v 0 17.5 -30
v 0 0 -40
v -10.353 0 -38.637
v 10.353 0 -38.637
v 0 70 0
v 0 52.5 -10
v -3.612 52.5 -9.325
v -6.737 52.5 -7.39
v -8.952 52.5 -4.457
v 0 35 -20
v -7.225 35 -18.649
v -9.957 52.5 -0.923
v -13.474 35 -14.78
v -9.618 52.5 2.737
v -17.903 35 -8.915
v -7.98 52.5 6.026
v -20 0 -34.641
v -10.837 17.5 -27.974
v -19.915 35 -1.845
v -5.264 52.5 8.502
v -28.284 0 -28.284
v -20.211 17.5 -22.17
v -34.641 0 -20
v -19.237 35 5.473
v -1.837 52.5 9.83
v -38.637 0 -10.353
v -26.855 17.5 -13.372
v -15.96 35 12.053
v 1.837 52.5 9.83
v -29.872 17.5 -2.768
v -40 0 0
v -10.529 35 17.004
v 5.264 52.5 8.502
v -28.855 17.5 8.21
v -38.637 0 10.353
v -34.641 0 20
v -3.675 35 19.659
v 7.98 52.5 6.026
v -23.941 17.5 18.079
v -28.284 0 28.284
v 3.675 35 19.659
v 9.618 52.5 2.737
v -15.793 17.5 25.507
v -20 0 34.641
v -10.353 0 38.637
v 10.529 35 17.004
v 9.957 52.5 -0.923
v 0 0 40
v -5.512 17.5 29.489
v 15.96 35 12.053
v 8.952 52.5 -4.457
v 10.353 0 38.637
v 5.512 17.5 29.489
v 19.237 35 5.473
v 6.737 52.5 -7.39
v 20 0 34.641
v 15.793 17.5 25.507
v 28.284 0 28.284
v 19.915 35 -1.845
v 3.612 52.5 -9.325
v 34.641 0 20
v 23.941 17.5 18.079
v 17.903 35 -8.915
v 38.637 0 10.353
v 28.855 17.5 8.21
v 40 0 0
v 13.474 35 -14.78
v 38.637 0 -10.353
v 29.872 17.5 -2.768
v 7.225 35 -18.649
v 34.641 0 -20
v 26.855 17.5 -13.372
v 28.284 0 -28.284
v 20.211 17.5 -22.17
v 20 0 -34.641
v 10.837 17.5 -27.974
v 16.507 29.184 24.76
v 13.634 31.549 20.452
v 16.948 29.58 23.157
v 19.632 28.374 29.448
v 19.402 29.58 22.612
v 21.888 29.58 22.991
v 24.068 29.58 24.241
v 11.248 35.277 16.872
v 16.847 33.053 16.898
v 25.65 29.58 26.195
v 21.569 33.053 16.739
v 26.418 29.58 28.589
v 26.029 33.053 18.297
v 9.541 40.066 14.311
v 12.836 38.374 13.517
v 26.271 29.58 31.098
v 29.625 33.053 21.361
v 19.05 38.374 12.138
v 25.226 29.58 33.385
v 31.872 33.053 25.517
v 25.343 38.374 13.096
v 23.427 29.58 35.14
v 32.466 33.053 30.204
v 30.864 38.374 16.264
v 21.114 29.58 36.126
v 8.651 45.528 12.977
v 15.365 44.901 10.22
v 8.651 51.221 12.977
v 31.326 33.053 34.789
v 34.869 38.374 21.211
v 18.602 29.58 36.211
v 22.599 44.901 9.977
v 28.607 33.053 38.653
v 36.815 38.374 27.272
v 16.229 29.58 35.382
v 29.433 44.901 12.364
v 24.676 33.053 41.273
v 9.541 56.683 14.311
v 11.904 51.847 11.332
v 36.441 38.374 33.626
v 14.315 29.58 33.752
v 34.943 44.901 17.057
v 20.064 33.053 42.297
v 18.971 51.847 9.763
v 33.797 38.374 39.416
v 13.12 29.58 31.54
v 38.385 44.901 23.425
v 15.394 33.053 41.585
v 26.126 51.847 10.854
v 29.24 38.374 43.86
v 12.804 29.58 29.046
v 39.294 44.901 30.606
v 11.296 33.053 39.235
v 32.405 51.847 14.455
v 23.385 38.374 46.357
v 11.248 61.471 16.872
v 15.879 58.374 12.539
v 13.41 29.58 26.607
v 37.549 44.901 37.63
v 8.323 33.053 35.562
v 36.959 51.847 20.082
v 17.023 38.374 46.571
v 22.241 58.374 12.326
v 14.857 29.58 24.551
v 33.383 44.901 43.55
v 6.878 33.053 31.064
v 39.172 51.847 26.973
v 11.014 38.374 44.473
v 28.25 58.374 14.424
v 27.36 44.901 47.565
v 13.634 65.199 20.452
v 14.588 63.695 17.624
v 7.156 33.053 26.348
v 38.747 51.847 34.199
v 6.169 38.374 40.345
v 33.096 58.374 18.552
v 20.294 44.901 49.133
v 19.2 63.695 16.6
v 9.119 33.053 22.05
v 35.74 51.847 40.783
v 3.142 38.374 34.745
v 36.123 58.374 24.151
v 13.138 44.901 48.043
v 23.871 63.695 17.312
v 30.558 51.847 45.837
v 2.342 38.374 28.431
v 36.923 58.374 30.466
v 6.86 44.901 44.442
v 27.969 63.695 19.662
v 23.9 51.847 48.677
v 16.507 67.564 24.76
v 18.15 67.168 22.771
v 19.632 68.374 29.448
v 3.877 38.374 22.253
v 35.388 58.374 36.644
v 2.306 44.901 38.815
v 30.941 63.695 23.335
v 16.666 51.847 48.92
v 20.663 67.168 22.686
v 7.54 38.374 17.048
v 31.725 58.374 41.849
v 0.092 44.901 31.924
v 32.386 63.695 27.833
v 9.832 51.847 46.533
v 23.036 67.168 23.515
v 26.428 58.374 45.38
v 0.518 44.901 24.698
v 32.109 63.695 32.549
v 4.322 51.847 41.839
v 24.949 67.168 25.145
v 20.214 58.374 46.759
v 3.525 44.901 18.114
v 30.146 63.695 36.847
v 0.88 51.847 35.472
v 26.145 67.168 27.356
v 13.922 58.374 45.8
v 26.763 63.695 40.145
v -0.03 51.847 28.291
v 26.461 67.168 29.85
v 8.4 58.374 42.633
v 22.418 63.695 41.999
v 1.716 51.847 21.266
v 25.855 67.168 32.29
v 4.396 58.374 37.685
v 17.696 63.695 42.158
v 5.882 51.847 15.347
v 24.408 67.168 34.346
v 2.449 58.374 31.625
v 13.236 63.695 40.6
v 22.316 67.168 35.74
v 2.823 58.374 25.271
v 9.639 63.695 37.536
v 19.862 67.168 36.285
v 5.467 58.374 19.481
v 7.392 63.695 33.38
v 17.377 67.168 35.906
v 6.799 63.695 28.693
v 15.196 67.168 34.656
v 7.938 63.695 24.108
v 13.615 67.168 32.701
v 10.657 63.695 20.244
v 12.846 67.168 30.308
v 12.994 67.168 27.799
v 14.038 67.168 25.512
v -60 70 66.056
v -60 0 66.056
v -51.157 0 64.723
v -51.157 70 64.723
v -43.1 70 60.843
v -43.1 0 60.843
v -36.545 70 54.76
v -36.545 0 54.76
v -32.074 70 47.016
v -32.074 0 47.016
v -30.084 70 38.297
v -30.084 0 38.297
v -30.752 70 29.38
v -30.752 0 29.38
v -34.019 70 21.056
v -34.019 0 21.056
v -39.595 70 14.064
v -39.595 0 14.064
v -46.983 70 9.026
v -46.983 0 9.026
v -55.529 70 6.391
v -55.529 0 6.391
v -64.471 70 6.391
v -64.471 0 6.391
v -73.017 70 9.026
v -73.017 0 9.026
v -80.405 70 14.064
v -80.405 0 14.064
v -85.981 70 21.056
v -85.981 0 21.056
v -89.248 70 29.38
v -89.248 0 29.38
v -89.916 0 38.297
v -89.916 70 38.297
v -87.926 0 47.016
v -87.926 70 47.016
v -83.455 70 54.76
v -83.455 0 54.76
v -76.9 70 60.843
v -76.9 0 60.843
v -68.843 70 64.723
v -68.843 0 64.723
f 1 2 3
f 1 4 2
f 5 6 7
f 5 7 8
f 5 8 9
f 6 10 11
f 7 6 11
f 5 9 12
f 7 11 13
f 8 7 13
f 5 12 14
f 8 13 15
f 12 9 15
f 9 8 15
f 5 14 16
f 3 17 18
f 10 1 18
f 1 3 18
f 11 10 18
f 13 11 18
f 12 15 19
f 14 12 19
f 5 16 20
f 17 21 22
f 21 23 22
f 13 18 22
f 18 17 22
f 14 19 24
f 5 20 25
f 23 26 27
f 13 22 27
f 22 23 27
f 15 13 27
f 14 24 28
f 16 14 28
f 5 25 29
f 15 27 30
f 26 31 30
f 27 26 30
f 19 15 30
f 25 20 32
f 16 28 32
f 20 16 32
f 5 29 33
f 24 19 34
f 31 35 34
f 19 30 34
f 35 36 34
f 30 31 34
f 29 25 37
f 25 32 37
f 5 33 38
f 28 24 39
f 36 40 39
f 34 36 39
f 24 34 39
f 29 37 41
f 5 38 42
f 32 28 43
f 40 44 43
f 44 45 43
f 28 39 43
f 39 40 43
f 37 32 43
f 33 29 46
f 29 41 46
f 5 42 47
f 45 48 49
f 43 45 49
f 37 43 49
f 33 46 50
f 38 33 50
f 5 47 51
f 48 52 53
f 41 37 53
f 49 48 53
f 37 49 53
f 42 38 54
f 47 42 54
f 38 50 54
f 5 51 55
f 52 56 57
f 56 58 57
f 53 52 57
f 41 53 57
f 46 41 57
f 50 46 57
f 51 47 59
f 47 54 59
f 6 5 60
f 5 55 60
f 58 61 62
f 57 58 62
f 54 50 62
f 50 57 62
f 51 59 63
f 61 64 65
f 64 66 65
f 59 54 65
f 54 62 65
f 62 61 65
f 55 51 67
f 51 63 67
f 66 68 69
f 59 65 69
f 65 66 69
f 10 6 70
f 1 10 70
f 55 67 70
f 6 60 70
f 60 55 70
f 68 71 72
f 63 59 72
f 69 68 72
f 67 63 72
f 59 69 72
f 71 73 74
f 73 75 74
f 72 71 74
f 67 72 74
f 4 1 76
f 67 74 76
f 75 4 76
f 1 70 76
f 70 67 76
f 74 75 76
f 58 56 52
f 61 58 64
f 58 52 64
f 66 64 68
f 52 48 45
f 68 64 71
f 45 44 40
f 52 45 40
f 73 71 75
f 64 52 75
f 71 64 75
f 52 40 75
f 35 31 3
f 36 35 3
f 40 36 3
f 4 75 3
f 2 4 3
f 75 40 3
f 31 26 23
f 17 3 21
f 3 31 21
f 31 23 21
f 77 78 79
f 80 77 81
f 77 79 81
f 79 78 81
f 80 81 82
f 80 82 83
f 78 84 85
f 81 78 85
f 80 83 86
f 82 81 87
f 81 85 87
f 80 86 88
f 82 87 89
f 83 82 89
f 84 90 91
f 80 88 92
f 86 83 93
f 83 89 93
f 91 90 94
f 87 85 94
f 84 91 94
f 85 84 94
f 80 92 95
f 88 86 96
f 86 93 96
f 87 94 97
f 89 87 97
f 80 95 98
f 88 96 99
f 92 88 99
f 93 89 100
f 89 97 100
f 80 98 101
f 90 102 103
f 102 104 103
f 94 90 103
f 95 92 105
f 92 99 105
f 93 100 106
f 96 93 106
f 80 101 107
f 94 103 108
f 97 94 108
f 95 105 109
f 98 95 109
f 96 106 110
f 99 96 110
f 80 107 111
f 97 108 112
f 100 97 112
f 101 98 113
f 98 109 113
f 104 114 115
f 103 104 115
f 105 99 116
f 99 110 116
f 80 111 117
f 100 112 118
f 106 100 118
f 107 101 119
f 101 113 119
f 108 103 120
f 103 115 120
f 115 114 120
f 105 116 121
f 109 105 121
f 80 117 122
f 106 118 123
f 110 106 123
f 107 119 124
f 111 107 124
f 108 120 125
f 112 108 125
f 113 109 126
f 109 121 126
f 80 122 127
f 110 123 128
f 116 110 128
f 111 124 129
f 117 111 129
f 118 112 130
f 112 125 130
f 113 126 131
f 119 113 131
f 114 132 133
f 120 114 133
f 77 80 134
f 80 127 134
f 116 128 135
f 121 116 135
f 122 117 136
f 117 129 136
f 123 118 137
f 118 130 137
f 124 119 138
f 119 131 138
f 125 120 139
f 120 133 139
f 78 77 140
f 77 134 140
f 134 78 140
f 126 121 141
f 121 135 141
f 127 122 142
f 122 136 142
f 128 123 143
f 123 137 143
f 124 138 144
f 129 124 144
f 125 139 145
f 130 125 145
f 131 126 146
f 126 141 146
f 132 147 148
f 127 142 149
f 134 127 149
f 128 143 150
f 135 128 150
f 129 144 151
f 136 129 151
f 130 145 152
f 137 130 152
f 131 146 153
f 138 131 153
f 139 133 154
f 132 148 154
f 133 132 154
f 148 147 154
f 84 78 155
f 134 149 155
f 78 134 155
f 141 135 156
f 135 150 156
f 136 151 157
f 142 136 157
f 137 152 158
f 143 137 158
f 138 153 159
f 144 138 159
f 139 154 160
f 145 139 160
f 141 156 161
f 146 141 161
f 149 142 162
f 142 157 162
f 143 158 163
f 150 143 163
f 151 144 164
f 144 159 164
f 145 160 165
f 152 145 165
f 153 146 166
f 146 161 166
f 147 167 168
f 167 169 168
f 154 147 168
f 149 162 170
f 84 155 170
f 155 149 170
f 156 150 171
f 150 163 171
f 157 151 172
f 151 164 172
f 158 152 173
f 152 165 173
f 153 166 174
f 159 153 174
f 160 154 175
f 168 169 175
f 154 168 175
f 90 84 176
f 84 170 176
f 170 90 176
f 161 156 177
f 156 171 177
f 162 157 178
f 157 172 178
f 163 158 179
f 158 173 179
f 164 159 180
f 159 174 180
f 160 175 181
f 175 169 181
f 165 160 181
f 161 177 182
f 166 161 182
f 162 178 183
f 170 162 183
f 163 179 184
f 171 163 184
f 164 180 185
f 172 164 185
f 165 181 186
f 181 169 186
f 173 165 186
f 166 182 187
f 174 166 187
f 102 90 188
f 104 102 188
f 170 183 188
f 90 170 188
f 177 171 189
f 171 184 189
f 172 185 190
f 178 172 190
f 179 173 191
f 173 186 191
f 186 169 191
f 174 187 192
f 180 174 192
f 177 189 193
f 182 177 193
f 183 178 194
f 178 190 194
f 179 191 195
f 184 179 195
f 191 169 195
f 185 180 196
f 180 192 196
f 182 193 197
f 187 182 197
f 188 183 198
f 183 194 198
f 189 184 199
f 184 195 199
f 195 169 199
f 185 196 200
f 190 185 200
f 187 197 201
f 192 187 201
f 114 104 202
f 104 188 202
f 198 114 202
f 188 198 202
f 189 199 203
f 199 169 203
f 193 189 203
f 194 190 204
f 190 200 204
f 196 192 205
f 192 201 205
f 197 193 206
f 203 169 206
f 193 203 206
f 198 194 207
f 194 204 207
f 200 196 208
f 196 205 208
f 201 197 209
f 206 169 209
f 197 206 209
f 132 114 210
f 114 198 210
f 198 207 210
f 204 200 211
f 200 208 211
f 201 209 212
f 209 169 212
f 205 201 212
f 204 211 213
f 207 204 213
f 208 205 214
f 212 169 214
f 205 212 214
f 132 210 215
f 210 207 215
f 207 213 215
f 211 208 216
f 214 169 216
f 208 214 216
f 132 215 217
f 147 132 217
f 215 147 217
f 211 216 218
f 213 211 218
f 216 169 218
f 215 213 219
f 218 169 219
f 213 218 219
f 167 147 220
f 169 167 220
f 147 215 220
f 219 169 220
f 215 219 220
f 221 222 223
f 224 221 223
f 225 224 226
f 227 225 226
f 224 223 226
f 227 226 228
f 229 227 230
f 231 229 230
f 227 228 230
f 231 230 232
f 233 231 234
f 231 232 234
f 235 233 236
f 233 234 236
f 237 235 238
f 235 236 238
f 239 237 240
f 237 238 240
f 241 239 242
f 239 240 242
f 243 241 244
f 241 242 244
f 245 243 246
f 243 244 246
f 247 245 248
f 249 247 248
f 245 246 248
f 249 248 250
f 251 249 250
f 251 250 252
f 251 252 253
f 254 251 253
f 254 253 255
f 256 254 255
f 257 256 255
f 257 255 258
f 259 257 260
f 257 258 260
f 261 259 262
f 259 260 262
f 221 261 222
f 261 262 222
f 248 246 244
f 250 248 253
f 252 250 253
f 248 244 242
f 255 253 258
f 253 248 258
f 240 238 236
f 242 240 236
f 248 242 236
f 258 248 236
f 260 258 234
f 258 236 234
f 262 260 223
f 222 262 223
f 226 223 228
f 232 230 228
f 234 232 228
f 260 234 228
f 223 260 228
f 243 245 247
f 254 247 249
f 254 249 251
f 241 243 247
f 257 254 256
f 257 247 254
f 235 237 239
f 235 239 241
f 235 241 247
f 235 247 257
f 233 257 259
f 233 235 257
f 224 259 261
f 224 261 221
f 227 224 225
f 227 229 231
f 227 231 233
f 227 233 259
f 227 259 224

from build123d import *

# Parameters (mm, degrees)
SKETCH1_R      = 30
EXTRUDE1_DEPTH = 70


with BuildPart() as part:
    # Sketch2 → Revolve1 (revolve)
    with BuildSketch(Plane.XY, mode=Mode.PRIVATE) as revolve1_sk:
        Polygon((40, 0), (0, 0), (0, 70), align=None)
    revolve(revolve1_sk.sketch.rotate(Axis((0, 0, 0), (0, 1, 0)), 90), axis=Axis((0, 0, 0), (0, 1, 0)))  # turned: the seam where the file's is


with BuildPart() as body_2:
    # Sketch1 → Extrude1 (new body)
    with BuildSketch(Plane(origin=(0, 0, 0), x_dir=(1, 0, 0), z_dir=(0, 1, 0))):
        with Locations(Location((-60, -36.055512755, 0), (0, 0, 270))):  # turned: the seam where the file's is
            Circle(SKETCH1_R)
    extrude(amount=EXTRUDE1_DEPTH)


with BuildPart() as body_3:
    # Sketch6 → Revolve2 (revolve)
    with BuildSketch(Plane(origin=(0, 0, 0), x_dir=(0.554700196, 0, 0.832050294), z_dir=(-0.832050294, 0, 0.554700196))):
        with BuildLine():
            Line((35.39261922, 68.374205107), (35.39261922, 28.374205107))
            ThreePointArc((35.39261922, 28.374205107), (15.39261922, 48.374205107), (35.39261922, 68.374205107))
        make_face()
    revolve(axis=Axis((19.632292826, 68.374205107, 29.448439239), (0, -1, 0)))


solid = Compound([part.part, body_2.part, body_3.part])
